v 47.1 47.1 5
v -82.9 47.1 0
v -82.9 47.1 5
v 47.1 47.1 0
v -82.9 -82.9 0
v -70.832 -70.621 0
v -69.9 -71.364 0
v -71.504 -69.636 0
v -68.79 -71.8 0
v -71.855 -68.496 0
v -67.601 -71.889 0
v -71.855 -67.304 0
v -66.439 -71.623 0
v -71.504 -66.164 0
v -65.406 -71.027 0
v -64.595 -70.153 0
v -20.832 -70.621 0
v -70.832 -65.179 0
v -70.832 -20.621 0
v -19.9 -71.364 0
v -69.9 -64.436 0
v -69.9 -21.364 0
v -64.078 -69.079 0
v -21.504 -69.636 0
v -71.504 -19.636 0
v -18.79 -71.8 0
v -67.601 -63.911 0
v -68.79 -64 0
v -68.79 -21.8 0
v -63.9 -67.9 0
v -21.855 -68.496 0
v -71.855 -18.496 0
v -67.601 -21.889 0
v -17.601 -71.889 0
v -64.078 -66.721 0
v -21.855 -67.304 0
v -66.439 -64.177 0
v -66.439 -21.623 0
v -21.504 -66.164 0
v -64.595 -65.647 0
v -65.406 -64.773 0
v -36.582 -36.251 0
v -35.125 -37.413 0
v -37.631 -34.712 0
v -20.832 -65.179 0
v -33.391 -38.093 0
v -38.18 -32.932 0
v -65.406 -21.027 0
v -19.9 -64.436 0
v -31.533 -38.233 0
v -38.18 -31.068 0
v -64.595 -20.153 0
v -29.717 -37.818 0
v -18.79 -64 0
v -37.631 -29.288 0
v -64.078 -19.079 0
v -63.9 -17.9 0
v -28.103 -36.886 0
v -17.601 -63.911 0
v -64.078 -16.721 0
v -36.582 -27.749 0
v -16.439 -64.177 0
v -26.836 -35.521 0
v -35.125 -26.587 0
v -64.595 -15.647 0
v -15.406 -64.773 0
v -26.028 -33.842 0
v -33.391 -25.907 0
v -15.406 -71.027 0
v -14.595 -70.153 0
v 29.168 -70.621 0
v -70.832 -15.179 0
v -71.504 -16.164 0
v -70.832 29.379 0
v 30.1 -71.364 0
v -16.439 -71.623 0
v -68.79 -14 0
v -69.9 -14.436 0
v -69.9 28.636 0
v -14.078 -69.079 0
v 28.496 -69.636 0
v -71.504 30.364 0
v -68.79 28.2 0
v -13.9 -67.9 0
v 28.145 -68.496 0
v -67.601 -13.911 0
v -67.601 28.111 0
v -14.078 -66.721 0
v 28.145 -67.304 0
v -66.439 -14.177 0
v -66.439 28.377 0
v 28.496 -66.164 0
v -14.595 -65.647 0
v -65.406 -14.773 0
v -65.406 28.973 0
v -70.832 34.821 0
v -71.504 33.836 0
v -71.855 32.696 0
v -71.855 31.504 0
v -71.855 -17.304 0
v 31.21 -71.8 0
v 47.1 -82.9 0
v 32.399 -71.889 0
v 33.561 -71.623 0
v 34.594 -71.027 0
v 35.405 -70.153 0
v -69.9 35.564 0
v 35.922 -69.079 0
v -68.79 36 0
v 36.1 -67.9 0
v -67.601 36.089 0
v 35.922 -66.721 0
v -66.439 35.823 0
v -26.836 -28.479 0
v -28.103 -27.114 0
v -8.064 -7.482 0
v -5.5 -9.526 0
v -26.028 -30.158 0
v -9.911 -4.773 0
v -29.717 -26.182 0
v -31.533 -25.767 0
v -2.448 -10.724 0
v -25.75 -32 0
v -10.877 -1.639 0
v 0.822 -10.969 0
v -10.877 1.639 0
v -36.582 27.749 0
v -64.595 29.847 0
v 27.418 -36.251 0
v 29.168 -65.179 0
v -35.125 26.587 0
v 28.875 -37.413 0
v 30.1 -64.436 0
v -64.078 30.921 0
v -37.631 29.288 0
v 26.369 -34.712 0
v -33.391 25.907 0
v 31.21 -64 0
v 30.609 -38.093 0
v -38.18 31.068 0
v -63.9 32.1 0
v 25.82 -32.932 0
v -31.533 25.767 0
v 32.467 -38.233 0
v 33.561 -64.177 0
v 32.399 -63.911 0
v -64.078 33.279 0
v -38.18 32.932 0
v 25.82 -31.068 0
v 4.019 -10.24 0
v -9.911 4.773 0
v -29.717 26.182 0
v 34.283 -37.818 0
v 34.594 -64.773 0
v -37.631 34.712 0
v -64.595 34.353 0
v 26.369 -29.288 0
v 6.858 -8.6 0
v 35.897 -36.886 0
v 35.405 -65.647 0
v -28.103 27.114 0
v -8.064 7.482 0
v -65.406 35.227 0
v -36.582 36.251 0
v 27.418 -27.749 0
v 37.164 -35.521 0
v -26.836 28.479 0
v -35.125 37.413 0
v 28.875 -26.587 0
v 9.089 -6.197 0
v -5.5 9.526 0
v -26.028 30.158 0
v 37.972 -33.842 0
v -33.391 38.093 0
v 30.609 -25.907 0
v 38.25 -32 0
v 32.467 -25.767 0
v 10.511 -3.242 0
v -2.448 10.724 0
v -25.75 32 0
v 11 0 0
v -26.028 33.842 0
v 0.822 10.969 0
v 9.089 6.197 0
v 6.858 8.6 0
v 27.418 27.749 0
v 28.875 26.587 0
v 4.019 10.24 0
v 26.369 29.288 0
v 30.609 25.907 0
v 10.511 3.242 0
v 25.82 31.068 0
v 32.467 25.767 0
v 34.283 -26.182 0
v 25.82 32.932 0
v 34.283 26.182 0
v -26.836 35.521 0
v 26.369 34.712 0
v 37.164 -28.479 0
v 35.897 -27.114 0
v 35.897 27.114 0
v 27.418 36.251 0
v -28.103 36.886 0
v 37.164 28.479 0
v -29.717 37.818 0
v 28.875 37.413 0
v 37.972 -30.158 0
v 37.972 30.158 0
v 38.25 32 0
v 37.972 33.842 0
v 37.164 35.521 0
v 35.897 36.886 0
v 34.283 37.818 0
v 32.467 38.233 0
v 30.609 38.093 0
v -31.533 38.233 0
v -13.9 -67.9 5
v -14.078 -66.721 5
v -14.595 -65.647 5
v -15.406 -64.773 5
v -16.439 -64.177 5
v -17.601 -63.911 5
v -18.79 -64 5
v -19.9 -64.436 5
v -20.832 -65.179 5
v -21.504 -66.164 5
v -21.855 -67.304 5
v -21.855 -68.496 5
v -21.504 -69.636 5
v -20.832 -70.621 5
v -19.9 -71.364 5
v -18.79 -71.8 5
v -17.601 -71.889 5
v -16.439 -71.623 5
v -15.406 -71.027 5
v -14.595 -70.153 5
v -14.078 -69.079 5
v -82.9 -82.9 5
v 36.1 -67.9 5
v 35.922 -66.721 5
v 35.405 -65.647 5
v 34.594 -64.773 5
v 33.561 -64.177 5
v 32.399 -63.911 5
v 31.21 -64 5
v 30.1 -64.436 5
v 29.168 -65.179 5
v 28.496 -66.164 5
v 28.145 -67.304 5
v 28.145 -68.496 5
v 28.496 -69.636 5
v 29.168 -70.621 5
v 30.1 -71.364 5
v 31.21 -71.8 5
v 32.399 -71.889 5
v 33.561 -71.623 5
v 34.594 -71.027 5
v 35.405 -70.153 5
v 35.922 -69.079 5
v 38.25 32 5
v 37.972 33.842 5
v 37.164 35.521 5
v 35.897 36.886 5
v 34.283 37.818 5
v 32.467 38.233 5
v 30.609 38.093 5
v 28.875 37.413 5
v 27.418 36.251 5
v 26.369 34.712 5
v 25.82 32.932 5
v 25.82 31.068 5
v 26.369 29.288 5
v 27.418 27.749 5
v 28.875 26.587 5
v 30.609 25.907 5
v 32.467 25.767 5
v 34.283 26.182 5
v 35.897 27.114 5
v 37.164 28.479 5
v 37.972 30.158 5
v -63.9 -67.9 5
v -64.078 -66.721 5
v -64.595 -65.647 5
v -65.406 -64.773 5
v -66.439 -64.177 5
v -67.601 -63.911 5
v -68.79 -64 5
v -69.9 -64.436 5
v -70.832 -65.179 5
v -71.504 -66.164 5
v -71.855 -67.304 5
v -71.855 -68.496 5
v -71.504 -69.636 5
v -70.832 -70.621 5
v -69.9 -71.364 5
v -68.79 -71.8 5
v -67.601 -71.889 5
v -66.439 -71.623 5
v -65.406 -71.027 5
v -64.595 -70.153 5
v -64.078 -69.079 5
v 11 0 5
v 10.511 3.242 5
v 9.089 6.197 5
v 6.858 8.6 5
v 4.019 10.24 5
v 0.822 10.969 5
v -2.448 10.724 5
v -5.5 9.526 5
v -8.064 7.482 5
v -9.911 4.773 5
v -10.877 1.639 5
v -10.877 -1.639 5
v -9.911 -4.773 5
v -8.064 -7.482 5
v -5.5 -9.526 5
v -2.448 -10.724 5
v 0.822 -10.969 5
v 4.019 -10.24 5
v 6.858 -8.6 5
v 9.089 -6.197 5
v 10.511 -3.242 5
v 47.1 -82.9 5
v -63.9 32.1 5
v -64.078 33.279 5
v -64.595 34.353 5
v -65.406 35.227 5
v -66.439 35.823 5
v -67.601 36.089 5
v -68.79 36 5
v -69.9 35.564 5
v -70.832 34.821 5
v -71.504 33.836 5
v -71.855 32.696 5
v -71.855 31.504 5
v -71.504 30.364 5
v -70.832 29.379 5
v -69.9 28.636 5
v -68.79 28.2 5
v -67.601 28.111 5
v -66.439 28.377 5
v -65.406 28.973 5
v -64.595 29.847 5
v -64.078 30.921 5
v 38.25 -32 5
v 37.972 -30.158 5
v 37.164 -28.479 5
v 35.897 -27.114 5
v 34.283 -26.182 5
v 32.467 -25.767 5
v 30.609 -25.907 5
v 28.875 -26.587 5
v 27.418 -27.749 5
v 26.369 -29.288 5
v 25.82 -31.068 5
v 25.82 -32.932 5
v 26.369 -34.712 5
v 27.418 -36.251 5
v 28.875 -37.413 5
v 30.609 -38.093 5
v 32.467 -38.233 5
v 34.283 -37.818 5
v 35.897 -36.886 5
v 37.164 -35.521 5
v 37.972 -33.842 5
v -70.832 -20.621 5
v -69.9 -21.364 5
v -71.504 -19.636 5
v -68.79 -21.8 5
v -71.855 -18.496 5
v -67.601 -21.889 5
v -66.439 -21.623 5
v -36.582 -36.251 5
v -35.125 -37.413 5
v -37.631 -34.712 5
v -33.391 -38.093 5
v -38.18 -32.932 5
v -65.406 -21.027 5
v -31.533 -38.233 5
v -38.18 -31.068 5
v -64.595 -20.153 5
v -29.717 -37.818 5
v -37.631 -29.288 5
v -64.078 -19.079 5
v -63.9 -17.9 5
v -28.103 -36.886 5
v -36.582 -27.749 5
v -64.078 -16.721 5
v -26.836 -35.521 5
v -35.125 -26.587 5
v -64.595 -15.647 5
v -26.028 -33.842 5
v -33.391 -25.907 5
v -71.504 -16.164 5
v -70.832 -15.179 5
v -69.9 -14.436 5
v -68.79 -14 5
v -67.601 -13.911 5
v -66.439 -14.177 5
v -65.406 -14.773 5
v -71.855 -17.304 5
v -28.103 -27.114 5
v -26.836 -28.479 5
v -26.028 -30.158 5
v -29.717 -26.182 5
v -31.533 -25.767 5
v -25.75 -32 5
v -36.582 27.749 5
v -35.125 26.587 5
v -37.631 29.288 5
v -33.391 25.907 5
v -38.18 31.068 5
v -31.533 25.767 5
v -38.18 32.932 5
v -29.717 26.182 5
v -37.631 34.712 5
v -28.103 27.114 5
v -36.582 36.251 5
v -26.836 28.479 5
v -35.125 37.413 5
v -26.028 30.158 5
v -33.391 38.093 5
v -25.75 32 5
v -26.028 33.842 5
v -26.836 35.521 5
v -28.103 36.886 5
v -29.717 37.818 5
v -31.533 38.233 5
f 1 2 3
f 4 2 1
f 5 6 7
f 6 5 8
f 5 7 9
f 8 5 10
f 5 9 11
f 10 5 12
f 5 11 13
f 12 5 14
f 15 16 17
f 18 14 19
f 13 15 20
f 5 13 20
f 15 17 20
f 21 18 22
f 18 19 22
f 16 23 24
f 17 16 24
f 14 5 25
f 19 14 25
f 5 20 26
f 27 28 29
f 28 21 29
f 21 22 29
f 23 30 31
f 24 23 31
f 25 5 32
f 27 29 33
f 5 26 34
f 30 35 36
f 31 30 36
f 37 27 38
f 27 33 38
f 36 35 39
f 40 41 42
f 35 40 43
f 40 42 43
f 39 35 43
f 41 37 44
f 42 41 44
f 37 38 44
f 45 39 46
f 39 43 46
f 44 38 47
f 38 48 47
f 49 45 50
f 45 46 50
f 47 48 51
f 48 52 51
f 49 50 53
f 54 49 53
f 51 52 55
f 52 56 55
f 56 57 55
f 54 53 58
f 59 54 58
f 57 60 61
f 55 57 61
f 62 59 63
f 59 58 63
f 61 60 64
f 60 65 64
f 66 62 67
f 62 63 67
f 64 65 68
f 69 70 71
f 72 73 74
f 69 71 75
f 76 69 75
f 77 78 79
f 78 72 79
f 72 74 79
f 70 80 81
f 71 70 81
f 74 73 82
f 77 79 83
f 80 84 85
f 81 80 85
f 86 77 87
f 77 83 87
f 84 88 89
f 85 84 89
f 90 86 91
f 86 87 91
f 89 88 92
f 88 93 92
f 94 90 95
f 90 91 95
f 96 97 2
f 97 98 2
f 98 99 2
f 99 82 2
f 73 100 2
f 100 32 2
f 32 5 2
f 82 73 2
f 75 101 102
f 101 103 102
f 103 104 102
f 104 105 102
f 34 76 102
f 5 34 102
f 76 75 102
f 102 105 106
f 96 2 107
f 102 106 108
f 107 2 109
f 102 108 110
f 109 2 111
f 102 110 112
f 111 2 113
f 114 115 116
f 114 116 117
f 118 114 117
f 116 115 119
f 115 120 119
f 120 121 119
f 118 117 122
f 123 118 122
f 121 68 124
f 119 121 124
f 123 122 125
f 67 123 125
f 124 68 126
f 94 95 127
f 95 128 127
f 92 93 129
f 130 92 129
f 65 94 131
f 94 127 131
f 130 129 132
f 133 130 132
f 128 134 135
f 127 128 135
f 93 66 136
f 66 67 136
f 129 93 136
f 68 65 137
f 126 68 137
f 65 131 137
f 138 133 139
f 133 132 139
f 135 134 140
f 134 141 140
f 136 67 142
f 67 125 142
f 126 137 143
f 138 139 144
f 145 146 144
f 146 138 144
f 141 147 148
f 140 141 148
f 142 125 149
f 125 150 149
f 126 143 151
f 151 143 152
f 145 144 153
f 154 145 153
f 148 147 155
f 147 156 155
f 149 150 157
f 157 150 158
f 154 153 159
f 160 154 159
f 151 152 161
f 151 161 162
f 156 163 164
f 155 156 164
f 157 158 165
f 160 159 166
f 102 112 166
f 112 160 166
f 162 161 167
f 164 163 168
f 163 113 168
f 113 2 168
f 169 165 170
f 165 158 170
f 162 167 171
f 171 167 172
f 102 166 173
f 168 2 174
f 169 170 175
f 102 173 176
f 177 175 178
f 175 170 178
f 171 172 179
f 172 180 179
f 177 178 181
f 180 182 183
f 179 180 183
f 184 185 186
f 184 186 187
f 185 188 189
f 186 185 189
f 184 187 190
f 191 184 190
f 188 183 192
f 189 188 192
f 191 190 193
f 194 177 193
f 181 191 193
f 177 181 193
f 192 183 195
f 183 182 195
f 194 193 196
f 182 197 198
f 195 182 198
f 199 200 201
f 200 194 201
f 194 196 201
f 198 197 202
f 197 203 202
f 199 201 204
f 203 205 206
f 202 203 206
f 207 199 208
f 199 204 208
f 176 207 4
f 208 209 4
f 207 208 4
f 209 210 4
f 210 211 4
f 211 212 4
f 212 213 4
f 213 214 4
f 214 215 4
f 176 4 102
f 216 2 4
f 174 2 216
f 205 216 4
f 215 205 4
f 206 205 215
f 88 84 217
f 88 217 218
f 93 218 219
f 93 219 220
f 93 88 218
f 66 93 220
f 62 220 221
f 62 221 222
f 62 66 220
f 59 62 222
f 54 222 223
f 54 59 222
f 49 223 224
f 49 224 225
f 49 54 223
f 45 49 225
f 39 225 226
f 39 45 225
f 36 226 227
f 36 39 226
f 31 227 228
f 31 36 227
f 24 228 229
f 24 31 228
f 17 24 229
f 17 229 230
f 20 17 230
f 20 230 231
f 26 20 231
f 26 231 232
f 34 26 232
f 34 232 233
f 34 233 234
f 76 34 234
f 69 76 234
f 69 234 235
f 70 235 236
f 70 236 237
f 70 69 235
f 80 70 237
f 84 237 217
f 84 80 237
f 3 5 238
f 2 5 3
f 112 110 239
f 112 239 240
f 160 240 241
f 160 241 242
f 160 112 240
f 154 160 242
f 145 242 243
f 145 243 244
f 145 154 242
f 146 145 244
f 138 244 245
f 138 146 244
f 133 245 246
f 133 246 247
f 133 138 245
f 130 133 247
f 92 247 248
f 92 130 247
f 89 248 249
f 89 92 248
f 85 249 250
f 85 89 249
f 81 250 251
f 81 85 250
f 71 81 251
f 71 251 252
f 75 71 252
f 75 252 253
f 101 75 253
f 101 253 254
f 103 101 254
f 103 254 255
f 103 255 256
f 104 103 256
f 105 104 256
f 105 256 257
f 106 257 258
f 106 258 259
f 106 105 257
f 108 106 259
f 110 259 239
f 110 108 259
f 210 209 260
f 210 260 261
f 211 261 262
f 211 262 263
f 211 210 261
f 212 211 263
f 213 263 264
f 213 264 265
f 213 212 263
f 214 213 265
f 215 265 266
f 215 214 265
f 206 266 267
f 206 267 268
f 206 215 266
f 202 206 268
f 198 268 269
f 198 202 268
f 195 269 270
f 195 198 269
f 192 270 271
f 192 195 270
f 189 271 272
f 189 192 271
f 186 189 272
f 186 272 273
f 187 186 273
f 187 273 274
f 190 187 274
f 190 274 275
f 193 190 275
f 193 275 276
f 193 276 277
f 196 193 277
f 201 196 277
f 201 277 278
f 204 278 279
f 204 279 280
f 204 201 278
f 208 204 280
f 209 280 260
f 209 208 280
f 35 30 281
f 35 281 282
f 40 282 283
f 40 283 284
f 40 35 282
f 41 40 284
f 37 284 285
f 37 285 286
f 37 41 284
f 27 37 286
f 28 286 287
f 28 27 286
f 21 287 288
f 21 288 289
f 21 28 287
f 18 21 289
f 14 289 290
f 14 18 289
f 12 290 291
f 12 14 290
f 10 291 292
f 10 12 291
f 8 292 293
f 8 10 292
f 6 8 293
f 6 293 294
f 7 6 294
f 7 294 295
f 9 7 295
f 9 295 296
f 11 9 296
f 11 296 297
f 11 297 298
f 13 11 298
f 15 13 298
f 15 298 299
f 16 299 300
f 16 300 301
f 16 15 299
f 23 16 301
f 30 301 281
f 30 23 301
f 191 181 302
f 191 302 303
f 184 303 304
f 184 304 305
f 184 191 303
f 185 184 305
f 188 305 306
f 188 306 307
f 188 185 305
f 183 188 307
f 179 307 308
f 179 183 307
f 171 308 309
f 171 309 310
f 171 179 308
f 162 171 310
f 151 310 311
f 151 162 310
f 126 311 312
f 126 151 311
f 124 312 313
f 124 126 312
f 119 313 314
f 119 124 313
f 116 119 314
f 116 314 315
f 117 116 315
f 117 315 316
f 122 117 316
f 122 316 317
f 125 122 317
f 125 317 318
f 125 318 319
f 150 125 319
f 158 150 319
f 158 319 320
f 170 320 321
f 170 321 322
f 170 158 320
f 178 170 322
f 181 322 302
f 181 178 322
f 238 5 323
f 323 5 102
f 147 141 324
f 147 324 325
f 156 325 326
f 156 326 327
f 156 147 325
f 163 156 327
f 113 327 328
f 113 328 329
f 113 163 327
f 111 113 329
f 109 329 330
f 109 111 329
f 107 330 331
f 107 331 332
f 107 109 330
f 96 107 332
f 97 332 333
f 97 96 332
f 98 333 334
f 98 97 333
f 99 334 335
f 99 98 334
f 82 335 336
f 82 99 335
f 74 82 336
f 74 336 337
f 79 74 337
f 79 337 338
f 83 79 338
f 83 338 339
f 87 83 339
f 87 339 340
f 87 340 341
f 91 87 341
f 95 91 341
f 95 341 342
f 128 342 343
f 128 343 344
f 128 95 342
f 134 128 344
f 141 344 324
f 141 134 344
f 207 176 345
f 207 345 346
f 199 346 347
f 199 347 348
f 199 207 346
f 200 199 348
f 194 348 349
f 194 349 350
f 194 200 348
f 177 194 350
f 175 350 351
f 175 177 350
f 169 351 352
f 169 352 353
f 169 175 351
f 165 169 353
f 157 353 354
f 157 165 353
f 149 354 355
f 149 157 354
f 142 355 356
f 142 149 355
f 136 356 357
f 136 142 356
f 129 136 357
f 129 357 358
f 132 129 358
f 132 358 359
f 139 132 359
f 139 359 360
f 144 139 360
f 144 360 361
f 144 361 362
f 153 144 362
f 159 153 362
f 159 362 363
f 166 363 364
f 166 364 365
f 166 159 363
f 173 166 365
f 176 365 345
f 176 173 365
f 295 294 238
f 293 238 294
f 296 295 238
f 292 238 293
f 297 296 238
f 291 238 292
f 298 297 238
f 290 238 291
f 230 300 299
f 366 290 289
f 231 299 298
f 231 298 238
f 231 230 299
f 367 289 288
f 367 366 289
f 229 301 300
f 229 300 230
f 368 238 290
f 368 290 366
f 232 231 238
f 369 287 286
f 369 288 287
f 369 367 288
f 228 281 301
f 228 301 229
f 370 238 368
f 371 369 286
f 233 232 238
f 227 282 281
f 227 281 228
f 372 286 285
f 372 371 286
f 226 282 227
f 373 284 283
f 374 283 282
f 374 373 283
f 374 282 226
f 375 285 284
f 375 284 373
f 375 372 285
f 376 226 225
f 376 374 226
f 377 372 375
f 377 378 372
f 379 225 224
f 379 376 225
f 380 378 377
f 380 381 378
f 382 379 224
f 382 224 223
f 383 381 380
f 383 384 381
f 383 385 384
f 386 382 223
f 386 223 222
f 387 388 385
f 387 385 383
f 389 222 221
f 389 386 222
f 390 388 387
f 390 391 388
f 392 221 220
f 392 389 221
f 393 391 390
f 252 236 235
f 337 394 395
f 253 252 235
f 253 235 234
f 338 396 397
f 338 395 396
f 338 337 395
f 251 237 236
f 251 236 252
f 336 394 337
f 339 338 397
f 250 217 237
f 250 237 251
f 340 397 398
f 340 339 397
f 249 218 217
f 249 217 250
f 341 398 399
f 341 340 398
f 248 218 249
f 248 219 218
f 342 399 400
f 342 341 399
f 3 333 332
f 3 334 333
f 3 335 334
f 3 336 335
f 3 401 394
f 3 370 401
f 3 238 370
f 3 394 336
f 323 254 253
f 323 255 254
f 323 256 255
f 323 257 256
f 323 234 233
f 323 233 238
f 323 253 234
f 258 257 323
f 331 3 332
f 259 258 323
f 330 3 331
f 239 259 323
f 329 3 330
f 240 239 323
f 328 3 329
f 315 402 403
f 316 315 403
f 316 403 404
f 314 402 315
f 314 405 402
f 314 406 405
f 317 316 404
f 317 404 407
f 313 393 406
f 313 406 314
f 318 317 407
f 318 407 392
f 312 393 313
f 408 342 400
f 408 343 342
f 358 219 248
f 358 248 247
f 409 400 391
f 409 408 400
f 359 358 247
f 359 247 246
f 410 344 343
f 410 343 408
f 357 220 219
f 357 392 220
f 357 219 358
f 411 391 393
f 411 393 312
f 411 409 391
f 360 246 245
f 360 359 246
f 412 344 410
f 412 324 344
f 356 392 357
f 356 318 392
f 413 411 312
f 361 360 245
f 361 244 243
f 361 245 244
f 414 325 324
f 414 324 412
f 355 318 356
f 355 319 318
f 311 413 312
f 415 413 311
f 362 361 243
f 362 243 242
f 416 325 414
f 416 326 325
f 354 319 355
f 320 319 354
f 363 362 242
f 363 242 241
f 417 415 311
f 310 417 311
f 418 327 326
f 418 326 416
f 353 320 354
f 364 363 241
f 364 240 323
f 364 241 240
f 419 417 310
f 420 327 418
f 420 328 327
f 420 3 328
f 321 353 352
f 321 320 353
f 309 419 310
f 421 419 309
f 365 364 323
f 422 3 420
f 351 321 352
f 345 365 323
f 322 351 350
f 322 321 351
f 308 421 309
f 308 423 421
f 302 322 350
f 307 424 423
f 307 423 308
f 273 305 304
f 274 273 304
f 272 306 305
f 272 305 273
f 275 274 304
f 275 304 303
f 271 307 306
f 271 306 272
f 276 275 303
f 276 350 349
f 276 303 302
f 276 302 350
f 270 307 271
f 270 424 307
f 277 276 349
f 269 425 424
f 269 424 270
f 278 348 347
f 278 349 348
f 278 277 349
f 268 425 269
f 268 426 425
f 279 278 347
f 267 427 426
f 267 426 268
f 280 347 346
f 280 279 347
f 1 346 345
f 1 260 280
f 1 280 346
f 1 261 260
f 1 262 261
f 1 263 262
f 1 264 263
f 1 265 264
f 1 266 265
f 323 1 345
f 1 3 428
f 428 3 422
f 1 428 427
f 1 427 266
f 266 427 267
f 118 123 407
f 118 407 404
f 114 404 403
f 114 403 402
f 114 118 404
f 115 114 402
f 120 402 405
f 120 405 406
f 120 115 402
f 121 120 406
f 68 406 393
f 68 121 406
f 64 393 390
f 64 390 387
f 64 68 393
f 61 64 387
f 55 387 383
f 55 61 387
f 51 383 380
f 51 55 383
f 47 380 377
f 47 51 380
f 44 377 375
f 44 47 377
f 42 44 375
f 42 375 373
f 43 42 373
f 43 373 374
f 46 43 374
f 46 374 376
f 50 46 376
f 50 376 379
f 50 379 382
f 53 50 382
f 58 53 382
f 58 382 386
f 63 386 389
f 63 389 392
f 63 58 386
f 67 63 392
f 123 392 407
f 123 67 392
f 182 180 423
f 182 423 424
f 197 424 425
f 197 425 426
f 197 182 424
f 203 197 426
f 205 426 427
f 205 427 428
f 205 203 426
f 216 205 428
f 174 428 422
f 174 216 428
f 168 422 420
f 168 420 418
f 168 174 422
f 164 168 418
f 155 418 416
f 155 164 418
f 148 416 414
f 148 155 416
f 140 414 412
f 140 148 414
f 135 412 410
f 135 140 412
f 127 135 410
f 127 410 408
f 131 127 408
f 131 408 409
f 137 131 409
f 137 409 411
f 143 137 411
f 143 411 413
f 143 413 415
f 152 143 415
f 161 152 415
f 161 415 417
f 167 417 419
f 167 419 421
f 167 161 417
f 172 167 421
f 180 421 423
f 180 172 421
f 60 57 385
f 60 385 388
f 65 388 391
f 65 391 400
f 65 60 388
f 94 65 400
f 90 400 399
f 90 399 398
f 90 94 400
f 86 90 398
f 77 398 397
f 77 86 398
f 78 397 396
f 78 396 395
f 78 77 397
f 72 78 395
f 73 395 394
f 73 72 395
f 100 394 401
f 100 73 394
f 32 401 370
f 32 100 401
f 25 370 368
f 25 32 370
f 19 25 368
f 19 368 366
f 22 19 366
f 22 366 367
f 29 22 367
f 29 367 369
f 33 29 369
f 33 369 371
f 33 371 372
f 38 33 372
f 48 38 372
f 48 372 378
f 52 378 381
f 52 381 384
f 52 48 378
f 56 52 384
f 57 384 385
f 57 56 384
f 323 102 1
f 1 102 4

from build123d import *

# Parameters (mm, degrees)
SKETCH_1_W      = 130
SKETCH_1_H      = 130
SKETCH_1_R      = 6.25
SKETCH_1_R_2    = 4
SKETCH_1_R_3    = 11
EXTRUDE_1_DEPTH = 5


with BuildPart() as part:
    # 草图1 → 凸台-拉伸1 (new body)
    with BuildSketch(Plane.XY):
        with Locations((-17.9, -17.9)):
            Rectangle(SKETCH_1_W, SKETCH_1_H)
        with Locations((-32, -32)):
            Circle(SKETCH_1_R, mode=Mode.SUBTRACT)
        with Locations((-32, 32)):
            Circle(SKETCH_1_R, mode=Mode.SUBTRACT)
        with Locations((32, 32)):
            Circle(SKETCH_1_R, mode=Mode.SUBTRACT)
        with Locations((32, -32)):
            Circle(SKETCH_1_R, mode=Mode.SUBTRACT)
        with Locations((-67.9, 32.1)):
            Circle(SKETCH_1_R_2, mode=Mode.SUBTRACT)
        with Locations((-67.9, -17.9)):
            Circle(SKETCH_1_R_2, mode=Mode.SUBTRACT)
        with Locations((-67.9, -67.9)):
            Circle(SKETCH_1_R_2, mode=Mode.SUBTRACT)
        with Locations((-17.9, -67.9)):
            Circle(SKETCH_1_R_2, mode=Mode.SUBTRACT)
        with Locations((32.1, -67.9)):
            Circle(SKETCH_1_R_2, mode=Mode.SUBTRACT)
        Circle(SKETCH_1_R_3, mode=Mode.SUBTRACT)
    extrude(amount=EXTRUDE_1_DEPTH)


solid = part.part
